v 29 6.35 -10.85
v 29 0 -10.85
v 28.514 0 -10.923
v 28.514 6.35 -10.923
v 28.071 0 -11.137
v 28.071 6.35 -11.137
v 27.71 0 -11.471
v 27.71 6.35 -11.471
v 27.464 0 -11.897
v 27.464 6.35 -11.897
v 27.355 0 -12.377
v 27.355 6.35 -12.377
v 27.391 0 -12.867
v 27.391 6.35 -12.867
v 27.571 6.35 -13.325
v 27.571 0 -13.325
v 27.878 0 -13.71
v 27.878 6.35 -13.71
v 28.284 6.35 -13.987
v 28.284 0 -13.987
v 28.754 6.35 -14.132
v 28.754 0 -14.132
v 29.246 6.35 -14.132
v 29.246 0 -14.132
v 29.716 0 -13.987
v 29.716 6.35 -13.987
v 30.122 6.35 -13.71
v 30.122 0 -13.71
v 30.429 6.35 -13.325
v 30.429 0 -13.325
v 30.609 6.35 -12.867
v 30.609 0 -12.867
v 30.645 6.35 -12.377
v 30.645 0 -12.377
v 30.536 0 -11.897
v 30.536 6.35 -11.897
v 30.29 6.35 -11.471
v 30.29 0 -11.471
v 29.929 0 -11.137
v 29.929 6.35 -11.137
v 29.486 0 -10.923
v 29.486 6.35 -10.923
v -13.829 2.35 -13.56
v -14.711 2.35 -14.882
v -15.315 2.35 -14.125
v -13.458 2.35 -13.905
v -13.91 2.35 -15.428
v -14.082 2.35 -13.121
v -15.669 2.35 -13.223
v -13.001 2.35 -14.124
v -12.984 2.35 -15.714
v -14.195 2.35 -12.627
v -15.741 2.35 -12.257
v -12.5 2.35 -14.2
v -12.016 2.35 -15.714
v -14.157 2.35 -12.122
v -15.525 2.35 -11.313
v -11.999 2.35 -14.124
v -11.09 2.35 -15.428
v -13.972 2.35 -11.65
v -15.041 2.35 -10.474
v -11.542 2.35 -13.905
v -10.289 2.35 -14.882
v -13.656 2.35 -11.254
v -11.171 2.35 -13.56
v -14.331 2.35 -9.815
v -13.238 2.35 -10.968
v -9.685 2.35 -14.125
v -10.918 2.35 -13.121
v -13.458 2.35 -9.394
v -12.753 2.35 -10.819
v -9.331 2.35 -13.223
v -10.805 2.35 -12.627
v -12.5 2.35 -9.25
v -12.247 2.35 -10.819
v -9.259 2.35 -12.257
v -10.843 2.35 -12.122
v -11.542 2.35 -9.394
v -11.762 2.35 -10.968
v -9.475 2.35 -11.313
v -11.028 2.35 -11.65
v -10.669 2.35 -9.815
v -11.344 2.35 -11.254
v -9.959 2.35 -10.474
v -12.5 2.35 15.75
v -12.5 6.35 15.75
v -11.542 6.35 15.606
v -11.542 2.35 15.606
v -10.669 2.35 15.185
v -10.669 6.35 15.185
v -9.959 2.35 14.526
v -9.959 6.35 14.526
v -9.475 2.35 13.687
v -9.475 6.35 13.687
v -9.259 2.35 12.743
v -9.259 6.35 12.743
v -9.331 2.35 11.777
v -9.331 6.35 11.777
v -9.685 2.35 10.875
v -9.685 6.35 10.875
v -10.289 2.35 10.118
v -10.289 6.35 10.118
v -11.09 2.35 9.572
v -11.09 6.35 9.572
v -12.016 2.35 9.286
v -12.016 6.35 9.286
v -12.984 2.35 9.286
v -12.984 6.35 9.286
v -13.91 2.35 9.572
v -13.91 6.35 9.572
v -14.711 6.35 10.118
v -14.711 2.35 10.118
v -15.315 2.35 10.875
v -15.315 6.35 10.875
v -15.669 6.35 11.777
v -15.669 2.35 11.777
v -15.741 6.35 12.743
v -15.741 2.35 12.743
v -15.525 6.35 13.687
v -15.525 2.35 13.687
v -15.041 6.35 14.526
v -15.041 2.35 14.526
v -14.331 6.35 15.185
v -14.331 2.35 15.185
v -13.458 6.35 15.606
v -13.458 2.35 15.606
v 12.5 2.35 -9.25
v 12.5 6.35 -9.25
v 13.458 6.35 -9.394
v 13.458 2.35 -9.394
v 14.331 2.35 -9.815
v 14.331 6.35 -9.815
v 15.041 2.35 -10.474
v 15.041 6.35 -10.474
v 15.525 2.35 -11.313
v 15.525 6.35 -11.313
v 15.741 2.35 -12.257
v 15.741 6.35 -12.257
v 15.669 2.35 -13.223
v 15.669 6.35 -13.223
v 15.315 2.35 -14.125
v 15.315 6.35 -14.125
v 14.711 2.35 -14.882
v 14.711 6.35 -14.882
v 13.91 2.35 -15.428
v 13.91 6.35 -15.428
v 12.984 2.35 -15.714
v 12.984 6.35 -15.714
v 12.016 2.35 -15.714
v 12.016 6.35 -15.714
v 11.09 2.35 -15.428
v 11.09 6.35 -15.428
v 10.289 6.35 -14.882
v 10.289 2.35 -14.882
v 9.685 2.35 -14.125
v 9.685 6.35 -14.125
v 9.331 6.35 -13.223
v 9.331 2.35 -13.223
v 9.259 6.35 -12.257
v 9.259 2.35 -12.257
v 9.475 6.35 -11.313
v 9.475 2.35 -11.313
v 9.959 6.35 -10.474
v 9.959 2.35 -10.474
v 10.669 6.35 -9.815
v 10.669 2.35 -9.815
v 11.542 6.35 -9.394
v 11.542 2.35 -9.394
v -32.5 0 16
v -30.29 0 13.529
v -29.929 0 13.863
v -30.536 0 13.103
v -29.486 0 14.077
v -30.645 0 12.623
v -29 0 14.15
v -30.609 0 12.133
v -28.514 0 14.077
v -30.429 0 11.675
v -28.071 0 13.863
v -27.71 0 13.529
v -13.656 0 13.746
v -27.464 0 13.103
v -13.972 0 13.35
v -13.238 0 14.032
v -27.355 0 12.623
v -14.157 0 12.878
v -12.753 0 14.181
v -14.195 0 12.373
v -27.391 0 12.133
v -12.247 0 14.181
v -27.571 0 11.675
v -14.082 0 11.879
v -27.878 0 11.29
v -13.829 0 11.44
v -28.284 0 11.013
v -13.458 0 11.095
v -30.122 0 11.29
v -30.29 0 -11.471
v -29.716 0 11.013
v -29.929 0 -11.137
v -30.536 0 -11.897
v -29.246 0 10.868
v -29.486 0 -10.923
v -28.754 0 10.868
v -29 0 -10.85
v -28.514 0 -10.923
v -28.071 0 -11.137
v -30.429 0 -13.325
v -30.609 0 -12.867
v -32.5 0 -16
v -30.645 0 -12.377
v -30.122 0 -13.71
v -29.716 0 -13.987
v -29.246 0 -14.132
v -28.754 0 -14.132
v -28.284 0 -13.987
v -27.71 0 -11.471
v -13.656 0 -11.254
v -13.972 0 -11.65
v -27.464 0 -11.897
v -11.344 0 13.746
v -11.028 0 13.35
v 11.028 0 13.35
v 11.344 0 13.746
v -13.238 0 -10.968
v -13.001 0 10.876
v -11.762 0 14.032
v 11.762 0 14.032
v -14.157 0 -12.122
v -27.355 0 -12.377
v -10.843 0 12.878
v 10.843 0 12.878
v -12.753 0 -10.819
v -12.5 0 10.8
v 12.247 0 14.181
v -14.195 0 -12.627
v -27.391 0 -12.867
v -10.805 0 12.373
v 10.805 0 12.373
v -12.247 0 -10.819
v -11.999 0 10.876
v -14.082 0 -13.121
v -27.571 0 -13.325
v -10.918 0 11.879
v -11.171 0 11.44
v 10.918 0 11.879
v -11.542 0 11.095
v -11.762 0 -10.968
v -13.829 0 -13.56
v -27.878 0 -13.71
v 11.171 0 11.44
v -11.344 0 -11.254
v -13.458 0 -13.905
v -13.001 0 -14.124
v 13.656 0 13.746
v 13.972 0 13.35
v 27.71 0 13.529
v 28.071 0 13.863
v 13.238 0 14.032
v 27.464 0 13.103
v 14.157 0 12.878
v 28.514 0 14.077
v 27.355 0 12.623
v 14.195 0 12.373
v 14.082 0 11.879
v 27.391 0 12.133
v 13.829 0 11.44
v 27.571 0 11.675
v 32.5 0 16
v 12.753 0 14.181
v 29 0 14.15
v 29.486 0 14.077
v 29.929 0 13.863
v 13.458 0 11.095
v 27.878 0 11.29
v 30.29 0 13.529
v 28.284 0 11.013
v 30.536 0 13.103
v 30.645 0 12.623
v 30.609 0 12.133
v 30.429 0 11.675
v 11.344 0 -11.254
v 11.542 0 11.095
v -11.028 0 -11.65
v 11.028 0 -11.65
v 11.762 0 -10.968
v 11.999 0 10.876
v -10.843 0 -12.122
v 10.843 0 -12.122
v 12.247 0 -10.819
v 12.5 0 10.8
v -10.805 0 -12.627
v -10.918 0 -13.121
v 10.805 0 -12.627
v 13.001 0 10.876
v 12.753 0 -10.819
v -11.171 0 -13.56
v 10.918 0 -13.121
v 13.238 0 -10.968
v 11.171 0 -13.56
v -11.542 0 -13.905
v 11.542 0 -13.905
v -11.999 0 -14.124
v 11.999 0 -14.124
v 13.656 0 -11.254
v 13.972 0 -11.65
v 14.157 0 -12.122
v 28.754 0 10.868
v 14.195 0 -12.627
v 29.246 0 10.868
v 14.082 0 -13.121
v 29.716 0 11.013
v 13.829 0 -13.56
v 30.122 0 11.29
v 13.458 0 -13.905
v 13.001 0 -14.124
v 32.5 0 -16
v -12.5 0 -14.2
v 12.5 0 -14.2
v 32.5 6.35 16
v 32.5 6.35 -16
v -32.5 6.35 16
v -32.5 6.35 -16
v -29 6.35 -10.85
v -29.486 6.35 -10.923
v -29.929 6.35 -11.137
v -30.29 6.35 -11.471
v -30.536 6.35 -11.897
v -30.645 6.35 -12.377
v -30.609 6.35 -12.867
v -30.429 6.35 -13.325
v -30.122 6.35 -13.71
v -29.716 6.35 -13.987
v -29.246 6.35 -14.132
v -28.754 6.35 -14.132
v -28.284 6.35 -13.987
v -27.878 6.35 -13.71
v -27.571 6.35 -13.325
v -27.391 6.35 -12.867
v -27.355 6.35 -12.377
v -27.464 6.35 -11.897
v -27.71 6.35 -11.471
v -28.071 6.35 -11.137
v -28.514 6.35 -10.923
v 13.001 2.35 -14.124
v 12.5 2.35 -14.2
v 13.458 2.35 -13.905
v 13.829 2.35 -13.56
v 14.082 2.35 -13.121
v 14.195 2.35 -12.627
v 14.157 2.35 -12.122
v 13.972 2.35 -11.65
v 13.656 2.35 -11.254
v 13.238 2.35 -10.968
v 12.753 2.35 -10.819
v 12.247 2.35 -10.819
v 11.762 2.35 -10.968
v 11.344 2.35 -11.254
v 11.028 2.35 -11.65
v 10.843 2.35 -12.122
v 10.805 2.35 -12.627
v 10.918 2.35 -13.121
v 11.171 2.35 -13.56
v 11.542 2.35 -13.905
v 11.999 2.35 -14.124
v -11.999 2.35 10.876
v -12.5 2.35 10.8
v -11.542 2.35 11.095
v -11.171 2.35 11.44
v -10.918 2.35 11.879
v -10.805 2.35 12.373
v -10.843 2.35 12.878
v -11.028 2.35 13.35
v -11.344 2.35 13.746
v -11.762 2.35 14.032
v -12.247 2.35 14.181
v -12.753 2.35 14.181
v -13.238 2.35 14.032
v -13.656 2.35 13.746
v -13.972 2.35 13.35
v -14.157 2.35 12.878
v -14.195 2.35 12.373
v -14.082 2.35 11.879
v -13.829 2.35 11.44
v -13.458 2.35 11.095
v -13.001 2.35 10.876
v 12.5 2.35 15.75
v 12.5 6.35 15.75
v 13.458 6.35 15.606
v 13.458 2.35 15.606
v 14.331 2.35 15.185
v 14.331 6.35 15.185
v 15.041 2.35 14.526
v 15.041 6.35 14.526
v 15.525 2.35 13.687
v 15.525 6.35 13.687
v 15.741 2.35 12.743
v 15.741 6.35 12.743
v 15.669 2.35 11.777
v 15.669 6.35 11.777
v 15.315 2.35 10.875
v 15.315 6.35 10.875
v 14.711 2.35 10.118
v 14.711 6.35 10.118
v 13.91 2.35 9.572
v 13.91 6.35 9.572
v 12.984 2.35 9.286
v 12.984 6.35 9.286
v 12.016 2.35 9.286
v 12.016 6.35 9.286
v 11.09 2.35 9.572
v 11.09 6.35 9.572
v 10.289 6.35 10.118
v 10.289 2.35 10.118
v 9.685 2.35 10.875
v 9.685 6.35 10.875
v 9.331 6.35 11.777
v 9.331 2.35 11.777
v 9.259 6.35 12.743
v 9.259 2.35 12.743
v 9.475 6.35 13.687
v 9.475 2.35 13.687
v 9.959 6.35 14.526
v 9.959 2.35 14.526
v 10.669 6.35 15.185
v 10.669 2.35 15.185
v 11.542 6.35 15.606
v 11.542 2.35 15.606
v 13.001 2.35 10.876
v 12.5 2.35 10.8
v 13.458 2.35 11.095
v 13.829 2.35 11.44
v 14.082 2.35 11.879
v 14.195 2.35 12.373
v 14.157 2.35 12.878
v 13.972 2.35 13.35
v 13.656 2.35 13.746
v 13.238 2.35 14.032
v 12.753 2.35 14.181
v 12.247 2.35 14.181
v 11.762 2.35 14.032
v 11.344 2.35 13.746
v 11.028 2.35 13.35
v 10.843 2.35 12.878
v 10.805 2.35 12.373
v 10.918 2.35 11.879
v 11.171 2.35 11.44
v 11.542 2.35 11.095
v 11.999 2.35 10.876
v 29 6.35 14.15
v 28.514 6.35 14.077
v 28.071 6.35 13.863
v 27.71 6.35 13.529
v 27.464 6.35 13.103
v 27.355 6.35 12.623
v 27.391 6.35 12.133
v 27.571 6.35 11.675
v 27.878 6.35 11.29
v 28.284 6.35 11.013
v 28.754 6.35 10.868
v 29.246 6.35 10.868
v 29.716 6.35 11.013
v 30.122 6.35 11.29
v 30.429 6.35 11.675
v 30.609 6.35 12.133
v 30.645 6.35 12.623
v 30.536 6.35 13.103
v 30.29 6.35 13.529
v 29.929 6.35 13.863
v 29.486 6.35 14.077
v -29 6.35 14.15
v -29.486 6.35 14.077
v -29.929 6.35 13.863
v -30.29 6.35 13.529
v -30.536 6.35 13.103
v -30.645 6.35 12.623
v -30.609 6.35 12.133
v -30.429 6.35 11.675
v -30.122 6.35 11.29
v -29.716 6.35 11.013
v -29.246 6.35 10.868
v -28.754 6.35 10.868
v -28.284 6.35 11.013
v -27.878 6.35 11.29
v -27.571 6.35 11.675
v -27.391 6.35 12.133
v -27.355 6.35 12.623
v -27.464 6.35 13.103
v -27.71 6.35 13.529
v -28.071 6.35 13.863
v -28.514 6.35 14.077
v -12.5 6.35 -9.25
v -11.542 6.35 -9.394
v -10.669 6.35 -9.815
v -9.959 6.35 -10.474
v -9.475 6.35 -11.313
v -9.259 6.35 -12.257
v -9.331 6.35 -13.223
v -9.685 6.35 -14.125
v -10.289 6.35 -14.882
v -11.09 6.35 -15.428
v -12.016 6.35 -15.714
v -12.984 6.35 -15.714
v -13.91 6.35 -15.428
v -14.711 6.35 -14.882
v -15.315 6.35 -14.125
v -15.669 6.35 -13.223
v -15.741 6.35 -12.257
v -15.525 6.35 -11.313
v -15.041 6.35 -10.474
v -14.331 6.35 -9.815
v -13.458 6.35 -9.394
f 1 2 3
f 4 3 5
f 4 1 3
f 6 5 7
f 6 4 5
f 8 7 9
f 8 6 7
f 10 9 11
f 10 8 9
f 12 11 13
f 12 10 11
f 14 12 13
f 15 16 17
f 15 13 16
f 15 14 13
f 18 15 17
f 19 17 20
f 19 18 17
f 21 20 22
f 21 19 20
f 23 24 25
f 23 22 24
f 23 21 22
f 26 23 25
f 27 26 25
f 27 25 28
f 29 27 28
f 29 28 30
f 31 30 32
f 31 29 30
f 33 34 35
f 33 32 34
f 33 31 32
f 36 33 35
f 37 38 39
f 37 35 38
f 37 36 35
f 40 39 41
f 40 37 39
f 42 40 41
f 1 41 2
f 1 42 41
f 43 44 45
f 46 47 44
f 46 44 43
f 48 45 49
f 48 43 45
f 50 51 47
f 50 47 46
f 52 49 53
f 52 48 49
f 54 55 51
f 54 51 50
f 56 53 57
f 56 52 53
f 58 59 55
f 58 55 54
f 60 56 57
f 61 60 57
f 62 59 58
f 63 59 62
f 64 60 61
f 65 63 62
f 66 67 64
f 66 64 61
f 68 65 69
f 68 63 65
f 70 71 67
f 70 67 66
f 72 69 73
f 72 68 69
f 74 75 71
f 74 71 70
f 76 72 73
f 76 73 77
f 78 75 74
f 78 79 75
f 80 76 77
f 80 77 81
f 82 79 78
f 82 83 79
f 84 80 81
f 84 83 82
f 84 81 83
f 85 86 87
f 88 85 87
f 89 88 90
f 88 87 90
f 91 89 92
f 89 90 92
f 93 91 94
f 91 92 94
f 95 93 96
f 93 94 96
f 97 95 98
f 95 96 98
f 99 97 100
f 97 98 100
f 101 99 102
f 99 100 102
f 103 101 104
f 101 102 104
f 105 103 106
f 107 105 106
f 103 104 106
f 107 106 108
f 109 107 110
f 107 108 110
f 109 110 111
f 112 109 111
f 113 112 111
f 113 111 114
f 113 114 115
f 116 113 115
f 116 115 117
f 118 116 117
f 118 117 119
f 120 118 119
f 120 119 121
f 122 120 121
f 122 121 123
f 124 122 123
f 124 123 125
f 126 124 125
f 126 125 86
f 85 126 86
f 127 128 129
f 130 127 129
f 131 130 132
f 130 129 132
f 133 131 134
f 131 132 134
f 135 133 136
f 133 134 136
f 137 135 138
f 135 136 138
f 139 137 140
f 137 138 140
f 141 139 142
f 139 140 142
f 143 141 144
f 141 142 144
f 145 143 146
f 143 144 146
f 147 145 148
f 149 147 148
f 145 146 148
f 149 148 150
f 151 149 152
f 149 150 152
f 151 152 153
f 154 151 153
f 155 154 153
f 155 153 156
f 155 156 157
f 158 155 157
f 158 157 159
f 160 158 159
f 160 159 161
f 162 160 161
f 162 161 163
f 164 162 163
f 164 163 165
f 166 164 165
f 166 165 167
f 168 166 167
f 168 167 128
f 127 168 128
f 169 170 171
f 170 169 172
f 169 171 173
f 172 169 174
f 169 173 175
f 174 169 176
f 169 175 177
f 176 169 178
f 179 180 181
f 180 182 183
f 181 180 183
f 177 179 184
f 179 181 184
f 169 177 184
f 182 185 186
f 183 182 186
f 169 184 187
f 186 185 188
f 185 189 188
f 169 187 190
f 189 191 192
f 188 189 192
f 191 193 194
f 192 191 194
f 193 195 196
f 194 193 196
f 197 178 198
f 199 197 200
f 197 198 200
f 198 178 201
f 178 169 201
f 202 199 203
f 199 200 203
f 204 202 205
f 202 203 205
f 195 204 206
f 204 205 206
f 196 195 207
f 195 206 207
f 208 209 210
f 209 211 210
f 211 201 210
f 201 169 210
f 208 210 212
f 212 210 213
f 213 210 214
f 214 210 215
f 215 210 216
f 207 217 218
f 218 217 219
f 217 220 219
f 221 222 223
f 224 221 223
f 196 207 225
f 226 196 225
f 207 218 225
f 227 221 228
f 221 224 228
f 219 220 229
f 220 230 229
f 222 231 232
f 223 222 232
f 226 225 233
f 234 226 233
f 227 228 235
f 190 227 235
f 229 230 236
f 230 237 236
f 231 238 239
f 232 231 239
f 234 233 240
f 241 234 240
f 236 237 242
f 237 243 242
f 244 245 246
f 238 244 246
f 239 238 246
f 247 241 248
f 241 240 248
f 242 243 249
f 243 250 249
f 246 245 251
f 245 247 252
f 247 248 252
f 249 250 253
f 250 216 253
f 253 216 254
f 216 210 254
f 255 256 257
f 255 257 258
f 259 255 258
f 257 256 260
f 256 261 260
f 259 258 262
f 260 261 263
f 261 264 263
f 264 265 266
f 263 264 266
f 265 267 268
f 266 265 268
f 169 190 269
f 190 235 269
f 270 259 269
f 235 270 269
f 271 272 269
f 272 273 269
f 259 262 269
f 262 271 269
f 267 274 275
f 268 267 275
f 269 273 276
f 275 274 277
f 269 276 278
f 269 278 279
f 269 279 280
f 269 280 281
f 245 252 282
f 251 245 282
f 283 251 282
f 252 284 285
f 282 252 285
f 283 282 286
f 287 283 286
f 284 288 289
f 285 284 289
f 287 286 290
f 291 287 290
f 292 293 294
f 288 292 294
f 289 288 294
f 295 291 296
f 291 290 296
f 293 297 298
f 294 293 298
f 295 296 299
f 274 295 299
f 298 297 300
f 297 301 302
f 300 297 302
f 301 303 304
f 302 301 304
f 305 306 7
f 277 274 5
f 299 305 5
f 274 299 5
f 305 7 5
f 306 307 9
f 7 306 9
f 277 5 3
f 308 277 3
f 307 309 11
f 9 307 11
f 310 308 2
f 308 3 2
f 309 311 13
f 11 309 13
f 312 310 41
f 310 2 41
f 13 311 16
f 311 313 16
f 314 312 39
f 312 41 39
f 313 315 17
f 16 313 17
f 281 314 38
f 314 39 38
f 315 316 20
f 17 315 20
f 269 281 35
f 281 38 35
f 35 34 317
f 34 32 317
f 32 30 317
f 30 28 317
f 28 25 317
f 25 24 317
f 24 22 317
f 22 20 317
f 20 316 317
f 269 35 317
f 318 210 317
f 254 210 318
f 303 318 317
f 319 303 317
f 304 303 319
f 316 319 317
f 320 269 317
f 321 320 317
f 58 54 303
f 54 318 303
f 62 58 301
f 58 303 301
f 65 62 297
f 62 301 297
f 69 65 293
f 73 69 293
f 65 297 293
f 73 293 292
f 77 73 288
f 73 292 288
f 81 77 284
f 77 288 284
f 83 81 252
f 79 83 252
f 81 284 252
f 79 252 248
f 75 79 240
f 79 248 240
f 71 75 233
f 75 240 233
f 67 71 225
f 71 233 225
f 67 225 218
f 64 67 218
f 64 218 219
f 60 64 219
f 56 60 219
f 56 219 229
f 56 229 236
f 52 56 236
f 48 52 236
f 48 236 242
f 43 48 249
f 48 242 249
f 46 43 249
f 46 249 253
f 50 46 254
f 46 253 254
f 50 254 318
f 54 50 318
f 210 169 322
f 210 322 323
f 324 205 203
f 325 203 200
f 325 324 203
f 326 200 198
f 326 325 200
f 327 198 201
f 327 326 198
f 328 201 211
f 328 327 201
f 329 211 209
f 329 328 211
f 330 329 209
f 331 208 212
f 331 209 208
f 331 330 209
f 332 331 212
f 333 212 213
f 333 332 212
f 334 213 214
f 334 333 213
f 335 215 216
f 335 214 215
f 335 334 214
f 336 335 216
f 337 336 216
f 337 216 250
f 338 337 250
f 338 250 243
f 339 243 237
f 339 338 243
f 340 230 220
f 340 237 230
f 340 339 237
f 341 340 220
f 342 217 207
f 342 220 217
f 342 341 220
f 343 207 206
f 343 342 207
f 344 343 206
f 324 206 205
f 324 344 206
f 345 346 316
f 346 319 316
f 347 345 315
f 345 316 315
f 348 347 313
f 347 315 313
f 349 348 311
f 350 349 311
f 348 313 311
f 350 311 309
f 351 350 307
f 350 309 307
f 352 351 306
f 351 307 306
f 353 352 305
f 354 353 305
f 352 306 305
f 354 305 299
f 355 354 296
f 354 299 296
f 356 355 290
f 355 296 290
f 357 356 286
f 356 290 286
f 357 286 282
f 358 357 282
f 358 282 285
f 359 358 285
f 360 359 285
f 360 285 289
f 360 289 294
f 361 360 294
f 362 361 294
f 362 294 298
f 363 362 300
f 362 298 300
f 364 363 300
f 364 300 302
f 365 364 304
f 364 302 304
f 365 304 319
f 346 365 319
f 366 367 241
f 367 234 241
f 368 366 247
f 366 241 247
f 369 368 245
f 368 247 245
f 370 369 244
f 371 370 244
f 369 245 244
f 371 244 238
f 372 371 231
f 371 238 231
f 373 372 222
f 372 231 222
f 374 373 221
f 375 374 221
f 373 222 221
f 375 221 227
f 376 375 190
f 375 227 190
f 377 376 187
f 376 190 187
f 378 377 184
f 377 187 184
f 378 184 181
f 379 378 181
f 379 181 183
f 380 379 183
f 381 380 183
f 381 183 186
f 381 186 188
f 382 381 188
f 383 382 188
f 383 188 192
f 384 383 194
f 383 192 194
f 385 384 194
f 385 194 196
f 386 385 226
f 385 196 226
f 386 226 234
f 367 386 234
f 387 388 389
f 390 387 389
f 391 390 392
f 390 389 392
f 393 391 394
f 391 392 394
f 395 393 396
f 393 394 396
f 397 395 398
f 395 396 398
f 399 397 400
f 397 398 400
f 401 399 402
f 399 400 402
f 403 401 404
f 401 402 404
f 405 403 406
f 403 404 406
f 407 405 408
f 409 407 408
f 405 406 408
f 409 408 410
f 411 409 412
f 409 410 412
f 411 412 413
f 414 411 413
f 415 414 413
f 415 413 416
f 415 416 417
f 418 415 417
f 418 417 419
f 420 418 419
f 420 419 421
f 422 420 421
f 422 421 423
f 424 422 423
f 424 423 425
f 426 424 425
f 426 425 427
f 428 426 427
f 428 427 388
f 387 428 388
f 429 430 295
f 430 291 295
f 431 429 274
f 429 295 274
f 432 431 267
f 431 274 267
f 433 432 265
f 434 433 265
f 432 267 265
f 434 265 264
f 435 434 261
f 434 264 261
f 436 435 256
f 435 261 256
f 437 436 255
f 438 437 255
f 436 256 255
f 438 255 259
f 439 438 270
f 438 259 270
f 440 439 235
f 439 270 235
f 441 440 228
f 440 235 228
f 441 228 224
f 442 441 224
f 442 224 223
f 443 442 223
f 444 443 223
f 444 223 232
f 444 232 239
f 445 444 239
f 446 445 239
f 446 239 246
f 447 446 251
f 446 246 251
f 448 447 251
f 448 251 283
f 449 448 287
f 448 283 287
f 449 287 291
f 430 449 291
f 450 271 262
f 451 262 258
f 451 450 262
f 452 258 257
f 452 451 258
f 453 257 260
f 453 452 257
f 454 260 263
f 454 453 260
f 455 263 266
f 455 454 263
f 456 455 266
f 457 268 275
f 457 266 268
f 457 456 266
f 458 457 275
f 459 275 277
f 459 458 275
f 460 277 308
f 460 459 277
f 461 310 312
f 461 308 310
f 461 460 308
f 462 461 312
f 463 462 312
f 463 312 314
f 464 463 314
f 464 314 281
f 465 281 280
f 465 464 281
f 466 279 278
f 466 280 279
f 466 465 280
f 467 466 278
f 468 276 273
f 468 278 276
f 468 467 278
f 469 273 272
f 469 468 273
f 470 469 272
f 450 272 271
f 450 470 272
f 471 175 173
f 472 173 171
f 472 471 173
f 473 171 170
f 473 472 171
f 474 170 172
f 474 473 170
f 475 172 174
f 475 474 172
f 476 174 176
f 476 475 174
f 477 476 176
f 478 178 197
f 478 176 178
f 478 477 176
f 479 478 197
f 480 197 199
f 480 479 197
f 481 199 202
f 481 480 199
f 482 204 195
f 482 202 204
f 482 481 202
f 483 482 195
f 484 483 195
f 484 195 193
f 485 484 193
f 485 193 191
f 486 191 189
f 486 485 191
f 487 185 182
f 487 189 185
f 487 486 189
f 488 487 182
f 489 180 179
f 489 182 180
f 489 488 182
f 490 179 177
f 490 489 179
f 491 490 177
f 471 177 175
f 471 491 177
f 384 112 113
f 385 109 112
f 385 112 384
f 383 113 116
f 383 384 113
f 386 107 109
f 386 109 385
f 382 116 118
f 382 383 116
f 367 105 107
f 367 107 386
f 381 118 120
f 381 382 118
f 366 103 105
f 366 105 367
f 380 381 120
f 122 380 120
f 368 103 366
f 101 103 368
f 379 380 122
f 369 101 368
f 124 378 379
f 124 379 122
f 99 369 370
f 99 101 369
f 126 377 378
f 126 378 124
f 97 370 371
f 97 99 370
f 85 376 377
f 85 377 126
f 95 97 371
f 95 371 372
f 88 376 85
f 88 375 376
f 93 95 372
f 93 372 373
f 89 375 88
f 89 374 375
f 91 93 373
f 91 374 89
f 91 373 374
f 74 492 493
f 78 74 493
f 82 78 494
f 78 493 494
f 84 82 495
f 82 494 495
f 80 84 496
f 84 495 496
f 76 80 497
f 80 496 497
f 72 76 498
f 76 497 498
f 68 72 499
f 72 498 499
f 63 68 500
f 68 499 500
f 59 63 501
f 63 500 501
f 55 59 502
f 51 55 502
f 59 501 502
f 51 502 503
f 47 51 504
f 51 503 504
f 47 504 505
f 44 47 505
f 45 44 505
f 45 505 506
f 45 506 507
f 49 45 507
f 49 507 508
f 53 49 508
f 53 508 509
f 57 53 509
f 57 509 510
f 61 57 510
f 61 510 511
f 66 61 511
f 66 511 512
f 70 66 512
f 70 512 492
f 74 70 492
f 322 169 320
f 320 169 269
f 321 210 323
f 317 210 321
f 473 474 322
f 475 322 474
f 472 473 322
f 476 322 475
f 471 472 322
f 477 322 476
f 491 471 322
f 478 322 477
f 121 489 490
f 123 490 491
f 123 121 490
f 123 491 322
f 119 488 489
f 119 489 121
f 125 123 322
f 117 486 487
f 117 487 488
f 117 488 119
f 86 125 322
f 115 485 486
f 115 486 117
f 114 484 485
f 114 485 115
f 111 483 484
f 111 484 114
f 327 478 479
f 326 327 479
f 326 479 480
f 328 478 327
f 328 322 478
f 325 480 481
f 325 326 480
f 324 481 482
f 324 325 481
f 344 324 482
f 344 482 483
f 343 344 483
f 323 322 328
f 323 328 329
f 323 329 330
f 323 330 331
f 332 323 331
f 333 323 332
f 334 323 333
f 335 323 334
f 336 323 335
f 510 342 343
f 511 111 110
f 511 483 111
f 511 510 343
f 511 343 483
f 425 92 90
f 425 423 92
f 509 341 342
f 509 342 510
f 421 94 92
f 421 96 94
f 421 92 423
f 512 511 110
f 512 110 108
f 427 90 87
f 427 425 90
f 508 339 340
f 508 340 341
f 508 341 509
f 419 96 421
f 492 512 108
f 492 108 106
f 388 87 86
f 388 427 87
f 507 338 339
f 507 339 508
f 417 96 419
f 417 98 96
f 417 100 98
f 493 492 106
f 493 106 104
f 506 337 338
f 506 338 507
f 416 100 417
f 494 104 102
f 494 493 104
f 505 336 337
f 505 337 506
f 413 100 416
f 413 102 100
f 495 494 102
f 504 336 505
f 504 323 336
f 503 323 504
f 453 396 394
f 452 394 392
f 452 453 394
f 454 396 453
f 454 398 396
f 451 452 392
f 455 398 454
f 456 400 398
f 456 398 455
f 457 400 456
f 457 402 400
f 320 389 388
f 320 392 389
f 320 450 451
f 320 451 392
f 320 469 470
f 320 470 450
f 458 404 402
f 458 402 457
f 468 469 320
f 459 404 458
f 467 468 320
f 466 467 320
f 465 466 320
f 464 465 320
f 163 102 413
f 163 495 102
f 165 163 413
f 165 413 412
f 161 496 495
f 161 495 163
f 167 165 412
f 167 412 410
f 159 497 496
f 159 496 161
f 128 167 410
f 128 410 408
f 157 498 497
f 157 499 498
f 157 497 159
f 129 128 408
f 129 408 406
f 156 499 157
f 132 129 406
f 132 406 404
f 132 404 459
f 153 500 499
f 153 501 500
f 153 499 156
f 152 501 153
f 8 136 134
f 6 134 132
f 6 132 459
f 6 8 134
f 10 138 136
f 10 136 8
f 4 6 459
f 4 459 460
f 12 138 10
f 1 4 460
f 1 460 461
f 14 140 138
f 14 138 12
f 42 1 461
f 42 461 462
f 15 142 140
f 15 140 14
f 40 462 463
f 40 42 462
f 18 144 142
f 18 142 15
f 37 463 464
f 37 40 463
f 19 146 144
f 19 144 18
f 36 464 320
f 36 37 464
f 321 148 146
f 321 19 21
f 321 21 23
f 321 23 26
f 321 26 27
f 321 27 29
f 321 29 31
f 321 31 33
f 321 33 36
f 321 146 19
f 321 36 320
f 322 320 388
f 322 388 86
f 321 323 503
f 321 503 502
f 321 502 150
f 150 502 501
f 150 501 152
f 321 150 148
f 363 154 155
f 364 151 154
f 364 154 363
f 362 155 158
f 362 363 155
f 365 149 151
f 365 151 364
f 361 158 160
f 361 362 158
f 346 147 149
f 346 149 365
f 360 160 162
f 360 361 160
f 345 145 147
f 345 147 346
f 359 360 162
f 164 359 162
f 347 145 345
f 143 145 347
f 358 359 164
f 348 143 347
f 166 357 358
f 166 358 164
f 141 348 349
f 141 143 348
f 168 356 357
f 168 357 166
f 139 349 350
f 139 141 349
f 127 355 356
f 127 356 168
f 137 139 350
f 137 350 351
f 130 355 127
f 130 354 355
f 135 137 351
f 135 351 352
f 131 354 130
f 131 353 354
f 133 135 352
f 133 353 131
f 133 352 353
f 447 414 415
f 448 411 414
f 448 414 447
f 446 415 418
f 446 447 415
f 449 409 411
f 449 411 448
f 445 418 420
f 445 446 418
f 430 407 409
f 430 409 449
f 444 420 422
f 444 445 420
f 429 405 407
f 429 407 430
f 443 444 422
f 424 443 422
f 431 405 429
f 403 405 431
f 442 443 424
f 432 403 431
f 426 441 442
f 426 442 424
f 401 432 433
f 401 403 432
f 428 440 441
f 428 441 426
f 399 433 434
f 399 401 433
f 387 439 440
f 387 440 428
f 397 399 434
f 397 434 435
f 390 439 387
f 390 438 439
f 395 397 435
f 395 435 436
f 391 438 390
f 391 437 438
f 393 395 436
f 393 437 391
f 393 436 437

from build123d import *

# Parameters (mm, degrees)
SKETCH1_W                      = 65
SKETCH1_H                      = 32
EXTRUDE1_DEPTH                 = 6.35
CBORE_FOR_M3_SHCS2_D           = 3.4
CBORE_FOR_M3_SHCS2_CBORE_D     = 6.5
CBORE_FOR_M3_SHCS2_CBORE_DEPTH = 4
LPATTERN1_COUNT                = 2
LPATTERN1_PITCH                = 25
LPATTERN1_COUNT_DIR2           = 2
LPATTERN1_PITCH_DIR2           = 25
LPATTERN2_COUNT                = 2
LPATTERN2_PITCH                = 58
LPATTERN2_COUNT_DIR2           = 2
LPATTERN2_PITCH_DIR2           = 25


with BuildPart() as part:
    # Sketch1 → Extrude1 (new body)
    with BuildSketch(Plane(origin=(0, 0, 0), x_dir=(1, 0, 0), z_dir=(0, 1, 0))):
        Rectangle(SKETCH1_W, SKETCH1_H)
    extrude(amount=EXTRUDE1_DEPTH)

    # CBORE for M3 SHCS2 (through all)
    with Locations(Plane(origin=(-12.5, 6.35, -12.5), x_dir=(0, 0, 1), z_dir=(0, 1, 0))):
        with Locations((0, 0)):
            cbore_for_m3_shcs2 = CounterBoreHole(CBORE_FOR_M3_SHCS2_D / 2, CBORE_FOR_M3_SHCS2_CBORE_D / 2, CBORE_FOR_M3_SHCS2_CBORE_DEPTH)

    # LPattern1: CBORE for M3 SHCS2 2 × 2
    with Locations(*[(i * LPATTERN1_PITCH, 0, j * LPATTERN1_PITCH_DIR2) for i in range(LPATTERN1_COUNT) for j in range(LPATTERN1_COUNT_DIR2) if (i, j) != (0, 0)]):
        add(cbore_for_m3_shcs2, mode=Mode.SUBTRACT)

    # Sketch5 → M4x0.7 Tapped Hole1 (revolve, cut)
    with BuildSketch(Plane(origin=(-29, 6.35, -12.5), x_dir=(0, 0, 1), z_dir=(1, 0, 0))):
        Polygon((0, 0), (0, 12.491420021), (1.65, 11.5), (1.65, 0), align=None)
    m4x0_7_tapped_hole1 = revolve(axis=Axis((-29, 12.7, -12.5), (0, -1, 0)), mode=Mode.SUBTRACT)

    # LPattern2: M4x0.7 Tapped Hole1 2 × 2
    with Locations(*[(i * LPATTERN2_PITCH, 0, j * LPATTERN2_PITCH_DIR2) for i in range(LPATTERN2_COUNT) for j in range(LPATTERN2_COUNT_DIR2) if (i, j) != (0, 0)]):
        add(m4x0_7_tapped_hole1, mode=Mode.SUBTRACT)


solid = part.part
